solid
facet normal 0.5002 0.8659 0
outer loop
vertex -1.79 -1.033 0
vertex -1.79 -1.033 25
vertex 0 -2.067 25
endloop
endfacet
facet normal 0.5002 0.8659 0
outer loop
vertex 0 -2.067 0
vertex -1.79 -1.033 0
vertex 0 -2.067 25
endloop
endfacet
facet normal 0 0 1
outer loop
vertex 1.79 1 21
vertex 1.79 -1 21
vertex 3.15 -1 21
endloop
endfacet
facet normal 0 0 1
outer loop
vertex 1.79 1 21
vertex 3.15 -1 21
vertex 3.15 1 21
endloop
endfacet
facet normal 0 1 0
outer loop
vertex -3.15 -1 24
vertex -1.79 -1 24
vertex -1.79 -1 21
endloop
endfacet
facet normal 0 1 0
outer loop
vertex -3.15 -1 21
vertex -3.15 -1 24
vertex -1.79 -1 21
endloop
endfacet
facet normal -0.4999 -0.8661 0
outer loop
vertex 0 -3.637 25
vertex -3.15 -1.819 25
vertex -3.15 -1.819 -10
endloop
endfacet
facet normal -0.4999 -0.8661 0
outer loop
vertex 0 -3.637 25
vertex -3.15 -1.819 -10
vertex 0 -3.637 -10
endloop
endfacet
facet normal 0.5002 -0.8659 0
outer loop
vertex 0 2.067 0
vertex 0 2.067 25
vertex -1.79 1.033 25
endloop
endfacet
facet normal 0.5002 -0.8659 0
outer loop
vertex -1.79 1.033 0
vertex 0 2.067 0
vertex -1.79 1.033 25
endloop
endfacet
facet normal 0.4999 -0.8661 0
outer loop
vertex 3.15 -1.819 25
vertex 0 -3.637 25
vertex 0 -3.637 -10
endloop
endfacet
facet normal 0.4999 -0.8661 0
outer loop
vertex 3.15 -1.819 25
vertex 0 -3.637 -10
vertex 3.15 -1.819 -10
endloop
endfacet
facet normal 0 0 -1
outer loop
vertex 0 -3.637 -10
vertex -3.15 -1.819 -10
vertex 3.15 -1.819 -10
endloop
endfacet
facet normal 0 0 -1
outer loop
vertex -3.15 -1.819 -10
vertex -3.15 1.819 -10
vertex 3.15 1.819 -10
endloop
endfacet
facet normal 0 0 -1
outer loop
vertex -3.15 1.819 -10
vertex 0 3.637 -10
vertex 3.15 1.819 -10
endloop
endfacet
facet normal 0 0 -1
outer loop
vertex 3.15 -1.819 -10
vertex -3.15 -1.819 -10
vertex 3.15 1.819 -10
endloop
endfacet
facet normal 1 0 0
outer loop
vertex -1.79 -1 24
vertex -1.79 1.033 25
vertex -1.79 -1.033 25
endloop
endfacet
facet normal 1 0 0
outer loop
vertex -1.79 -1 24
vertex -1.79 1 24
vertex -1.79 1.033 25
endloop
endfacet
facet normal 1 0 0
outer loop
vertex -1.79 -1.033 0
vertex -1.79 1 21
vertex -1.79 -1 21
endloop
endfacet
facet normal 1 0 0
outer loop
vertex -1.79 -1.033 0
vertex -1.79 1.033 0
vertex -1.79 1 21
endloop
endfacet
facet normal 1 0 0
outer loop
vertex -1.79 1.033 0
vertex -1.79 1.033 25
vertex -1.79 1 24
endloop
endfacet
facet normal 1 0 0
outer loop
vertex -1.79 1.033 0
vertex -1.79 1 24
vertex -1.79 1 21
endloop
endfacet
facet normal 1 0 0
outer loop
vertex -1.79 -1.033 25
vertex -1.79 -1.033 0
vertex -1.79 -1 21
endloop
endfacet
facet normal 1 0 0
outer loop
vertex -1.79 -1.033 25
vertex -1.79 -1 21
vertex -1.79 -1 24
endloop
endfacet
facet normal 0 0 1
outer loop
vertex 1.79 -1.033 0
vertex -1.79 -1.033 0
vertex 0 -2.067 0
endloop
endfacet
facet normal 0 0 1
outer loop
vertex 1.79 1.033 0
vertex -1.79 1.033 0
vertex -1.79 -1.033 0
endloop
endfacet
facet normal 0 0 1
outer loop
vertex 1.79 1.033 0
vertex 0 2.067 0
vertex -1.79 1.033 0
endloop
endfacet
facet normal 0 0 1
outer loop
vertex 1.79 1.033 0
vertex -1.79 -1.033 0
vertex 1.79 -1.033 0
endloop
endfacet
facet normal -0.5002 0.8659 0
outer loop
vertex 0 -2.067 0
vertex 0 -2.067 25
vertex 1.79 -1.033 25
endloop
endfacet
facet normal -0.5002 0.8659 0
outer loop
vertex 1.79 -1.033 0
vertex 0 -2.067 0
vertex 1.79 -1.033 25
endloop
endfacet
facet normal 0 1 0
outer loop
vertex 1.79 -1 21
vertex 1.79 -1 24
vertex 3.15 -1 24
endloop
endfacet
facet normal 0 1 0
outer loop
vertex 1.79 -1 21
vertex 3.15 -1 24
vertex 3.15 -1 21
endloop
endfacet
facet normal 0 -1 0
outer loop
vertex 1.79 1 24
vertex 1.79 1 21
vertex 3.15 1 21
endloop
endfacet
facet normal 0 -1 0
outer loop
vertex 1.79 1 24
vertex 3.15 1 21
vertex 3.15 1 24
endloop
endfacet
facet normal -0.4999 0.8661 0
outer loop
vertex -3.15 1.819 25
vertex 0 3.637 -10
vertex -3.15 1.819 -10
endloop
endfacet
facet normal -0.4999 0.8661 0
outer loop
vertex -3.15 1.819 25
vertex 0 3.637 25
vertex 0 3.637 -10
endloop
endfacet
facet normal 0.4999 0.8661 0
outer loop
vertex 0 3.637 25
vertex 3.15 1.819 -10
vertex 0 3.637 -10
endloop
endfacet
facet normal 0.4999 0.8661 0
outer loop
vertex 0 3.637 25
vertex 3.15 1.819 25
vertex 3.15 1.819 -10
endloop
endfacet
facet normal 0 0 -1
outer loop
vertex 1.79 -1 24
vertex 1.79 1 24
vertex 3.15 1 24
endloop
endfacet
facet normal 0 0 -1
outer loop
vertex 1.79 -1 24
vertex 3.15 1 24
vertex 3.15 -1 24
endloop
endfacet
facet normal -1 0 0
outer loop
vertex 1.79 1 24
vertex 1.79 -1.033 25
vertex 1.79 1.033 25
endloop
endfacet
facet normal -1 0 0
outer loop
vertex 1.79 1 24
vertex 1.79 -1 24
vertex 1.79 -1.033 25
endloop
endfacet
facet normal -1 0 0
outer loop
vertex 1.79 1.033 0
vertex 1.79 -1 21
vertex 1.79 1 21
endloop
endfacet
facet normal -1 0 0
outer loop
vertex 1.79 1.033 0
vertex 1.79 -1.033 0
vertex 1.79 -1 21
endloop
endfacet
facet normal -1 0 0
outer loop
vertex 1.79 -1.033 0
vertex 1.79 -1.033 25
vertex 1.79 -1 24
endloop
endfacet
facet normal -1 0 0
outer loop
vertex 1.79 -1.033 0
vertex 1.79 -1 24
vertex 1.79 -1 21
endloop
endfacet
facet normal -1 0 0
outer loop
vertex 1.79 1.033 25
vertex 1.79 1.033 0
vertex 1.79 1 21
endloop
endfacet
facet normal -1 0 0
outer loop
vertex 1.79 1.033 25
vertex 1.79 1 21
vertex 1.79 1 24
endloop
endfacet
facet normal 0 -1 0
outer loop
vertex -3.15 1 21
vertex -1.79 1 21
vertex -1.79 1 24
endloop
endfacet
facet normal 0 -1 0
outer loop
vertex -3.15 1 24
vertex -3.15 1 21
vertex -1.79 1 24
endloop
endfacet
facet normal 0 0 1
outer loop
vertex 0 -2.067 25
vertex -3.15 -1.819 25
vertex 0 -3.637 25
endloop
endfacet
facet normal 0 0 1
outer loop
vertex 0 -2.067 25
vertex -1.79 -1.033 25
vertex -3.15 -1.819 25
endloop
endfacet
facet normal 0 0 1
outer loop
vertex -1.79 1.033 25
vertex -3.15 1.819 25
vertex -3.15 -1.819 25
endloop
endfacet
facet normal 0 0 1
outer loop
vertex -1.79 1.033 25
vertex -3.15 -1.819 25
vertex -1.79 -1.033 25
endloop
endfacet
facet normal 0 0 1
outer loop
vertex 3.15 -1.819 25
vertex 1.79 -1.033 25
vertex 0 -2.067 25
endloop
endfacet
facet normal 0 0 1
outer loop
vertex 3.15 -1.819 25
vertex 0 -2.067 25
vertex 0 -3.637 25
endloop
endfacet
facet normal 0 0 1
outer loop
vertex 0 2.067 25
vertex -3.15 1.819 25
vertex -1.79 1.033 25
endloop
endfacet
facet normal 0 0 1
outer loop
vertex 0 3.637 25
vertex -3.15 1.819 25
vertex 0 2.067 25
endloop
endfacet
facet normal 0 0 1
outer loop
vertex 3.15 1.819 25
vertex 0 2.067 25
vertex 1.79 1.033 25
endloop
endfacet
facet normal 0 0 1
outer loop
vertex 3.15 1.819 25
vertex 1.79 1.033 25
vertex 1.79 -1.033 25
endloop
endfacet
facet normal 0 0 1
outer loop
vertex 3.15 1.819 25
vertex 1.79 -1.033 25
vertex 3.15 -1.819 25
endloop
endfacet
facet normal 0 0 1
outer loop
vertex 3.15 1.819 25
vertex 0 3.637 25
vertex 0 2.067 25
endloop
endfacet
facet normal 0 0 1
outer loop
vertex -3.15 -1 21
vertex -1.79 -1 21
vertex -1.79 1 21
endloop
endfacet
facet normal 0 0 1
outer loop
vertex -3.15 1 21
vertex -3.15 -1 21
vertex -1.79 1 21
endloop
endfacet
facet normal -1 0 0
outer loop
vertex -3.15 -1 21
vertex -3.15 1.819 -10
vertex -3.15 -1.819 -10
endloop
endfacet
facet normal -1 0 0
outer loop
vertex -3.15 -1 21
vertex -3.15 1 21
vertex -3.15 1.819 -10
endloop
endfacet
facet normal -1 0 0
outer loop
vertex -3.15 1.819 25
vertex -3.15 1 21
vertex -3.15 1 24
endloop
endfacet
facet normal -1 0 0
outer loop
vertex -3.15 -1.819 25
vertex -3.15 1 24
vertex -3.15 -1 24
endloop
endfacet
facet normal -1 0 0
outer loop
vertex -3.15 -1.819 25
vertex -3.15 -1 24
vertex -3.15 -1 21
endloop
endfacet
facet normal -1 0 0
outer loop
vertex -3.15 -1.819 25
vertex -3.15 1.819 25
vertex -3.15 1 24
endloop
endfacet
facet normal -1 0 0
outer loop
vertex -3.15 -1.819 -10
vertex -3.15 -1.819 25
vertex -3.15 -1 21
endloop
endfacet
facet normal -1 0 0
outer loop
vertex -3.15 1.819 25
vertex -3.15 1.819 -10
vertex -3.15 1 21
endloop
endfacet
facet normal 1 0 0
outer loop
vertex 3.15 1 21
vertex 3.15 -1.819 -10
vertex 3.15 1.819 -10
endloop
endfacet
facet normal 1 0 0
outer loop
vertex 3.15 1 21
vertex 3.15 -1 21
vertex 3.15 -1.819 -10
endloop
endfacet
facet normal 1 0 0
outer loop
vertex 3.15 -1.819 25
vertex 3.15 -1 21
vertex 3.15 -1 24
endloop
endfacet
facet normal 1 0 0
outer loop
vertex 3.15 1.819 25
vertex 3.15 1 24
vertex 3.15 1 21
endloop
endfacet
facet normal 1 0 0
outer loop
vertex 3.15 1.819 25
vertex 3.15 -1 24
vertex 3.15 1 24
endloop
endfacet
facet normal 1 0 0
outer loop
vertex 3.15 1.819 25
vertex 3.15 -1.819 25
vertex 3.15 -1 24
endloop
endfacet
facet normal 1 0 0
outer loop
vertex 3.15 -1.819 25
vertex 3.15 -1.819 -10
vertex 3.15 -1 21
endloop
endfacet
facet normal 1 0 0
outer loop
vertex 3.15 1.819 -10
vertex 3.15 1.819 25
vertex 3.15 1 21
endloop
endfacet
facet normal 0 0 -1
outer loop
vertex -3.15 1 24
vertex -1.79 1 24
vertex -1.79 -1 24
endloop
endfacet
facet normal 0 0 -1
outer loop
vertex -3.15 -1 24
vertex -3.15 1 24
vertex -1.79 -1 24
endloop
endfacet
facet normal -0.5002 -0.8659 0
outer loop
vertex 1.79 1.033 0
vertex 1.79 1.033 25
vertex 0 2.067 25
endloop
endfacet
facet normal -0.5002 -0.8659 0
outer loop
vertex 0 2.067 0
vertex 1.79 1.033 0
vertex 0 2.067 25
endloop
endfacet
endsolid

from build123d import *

# Parameters (mm, degrees)
F1_DEPTH      = 25
F1_DEPTH_BACK = 10
F3_DEPTH      = 25
F5_DEPTH      = 13.6
F5_DEPTH_BACK = 25


with BuildPart() as f1:
    # F0 (on Top) → F1 (new body, two sides)
    with BuildSketch(Plane.XY) as f1_sk:
        Polygon((-3.15, 1.8186533479), (-3.15, -1.8186533479), (0, -3.6373066959), (3.15, -1.8186533479), (3.15, 1.8186533479), (0, 3.6373066959), align=None)
    extrude(amount=F1_DEPTH)
    extrude(f1_sk.sketch, amount=-F1_DEPTH_BACK)

    # F2 (on Top) → F3 (cut)
    with BuildSketch(Plane.XY):
        Polygon((-1.79, 1.0334569818), (-1.79, -1.0334569818), (0, -2.0669139637), (1.79, -1.0334569818), (1.79, 1.0334569818), (0, 2.0669139637), align=None)
    extrude(amount=F3_DEPTH, mode=Mode.SUBTRACT)

    # F4 (on Right) → F5 (cut, two sides)
    with BuildSketch(Plane.YZ) as f5_sk:
        Polygon((-1, 21), (0, 21), (1, 21), (1, 24), (0, 24), (-1, 24), align=None)
    extrude(amount=-F5_DEPTH, mode=Mode.SUBTRACT)
    extrude(f5_sk.sketch, amount=F5_DEPTH_BACK, mode=Mode.SUBTRACT)


solid = f1.part
